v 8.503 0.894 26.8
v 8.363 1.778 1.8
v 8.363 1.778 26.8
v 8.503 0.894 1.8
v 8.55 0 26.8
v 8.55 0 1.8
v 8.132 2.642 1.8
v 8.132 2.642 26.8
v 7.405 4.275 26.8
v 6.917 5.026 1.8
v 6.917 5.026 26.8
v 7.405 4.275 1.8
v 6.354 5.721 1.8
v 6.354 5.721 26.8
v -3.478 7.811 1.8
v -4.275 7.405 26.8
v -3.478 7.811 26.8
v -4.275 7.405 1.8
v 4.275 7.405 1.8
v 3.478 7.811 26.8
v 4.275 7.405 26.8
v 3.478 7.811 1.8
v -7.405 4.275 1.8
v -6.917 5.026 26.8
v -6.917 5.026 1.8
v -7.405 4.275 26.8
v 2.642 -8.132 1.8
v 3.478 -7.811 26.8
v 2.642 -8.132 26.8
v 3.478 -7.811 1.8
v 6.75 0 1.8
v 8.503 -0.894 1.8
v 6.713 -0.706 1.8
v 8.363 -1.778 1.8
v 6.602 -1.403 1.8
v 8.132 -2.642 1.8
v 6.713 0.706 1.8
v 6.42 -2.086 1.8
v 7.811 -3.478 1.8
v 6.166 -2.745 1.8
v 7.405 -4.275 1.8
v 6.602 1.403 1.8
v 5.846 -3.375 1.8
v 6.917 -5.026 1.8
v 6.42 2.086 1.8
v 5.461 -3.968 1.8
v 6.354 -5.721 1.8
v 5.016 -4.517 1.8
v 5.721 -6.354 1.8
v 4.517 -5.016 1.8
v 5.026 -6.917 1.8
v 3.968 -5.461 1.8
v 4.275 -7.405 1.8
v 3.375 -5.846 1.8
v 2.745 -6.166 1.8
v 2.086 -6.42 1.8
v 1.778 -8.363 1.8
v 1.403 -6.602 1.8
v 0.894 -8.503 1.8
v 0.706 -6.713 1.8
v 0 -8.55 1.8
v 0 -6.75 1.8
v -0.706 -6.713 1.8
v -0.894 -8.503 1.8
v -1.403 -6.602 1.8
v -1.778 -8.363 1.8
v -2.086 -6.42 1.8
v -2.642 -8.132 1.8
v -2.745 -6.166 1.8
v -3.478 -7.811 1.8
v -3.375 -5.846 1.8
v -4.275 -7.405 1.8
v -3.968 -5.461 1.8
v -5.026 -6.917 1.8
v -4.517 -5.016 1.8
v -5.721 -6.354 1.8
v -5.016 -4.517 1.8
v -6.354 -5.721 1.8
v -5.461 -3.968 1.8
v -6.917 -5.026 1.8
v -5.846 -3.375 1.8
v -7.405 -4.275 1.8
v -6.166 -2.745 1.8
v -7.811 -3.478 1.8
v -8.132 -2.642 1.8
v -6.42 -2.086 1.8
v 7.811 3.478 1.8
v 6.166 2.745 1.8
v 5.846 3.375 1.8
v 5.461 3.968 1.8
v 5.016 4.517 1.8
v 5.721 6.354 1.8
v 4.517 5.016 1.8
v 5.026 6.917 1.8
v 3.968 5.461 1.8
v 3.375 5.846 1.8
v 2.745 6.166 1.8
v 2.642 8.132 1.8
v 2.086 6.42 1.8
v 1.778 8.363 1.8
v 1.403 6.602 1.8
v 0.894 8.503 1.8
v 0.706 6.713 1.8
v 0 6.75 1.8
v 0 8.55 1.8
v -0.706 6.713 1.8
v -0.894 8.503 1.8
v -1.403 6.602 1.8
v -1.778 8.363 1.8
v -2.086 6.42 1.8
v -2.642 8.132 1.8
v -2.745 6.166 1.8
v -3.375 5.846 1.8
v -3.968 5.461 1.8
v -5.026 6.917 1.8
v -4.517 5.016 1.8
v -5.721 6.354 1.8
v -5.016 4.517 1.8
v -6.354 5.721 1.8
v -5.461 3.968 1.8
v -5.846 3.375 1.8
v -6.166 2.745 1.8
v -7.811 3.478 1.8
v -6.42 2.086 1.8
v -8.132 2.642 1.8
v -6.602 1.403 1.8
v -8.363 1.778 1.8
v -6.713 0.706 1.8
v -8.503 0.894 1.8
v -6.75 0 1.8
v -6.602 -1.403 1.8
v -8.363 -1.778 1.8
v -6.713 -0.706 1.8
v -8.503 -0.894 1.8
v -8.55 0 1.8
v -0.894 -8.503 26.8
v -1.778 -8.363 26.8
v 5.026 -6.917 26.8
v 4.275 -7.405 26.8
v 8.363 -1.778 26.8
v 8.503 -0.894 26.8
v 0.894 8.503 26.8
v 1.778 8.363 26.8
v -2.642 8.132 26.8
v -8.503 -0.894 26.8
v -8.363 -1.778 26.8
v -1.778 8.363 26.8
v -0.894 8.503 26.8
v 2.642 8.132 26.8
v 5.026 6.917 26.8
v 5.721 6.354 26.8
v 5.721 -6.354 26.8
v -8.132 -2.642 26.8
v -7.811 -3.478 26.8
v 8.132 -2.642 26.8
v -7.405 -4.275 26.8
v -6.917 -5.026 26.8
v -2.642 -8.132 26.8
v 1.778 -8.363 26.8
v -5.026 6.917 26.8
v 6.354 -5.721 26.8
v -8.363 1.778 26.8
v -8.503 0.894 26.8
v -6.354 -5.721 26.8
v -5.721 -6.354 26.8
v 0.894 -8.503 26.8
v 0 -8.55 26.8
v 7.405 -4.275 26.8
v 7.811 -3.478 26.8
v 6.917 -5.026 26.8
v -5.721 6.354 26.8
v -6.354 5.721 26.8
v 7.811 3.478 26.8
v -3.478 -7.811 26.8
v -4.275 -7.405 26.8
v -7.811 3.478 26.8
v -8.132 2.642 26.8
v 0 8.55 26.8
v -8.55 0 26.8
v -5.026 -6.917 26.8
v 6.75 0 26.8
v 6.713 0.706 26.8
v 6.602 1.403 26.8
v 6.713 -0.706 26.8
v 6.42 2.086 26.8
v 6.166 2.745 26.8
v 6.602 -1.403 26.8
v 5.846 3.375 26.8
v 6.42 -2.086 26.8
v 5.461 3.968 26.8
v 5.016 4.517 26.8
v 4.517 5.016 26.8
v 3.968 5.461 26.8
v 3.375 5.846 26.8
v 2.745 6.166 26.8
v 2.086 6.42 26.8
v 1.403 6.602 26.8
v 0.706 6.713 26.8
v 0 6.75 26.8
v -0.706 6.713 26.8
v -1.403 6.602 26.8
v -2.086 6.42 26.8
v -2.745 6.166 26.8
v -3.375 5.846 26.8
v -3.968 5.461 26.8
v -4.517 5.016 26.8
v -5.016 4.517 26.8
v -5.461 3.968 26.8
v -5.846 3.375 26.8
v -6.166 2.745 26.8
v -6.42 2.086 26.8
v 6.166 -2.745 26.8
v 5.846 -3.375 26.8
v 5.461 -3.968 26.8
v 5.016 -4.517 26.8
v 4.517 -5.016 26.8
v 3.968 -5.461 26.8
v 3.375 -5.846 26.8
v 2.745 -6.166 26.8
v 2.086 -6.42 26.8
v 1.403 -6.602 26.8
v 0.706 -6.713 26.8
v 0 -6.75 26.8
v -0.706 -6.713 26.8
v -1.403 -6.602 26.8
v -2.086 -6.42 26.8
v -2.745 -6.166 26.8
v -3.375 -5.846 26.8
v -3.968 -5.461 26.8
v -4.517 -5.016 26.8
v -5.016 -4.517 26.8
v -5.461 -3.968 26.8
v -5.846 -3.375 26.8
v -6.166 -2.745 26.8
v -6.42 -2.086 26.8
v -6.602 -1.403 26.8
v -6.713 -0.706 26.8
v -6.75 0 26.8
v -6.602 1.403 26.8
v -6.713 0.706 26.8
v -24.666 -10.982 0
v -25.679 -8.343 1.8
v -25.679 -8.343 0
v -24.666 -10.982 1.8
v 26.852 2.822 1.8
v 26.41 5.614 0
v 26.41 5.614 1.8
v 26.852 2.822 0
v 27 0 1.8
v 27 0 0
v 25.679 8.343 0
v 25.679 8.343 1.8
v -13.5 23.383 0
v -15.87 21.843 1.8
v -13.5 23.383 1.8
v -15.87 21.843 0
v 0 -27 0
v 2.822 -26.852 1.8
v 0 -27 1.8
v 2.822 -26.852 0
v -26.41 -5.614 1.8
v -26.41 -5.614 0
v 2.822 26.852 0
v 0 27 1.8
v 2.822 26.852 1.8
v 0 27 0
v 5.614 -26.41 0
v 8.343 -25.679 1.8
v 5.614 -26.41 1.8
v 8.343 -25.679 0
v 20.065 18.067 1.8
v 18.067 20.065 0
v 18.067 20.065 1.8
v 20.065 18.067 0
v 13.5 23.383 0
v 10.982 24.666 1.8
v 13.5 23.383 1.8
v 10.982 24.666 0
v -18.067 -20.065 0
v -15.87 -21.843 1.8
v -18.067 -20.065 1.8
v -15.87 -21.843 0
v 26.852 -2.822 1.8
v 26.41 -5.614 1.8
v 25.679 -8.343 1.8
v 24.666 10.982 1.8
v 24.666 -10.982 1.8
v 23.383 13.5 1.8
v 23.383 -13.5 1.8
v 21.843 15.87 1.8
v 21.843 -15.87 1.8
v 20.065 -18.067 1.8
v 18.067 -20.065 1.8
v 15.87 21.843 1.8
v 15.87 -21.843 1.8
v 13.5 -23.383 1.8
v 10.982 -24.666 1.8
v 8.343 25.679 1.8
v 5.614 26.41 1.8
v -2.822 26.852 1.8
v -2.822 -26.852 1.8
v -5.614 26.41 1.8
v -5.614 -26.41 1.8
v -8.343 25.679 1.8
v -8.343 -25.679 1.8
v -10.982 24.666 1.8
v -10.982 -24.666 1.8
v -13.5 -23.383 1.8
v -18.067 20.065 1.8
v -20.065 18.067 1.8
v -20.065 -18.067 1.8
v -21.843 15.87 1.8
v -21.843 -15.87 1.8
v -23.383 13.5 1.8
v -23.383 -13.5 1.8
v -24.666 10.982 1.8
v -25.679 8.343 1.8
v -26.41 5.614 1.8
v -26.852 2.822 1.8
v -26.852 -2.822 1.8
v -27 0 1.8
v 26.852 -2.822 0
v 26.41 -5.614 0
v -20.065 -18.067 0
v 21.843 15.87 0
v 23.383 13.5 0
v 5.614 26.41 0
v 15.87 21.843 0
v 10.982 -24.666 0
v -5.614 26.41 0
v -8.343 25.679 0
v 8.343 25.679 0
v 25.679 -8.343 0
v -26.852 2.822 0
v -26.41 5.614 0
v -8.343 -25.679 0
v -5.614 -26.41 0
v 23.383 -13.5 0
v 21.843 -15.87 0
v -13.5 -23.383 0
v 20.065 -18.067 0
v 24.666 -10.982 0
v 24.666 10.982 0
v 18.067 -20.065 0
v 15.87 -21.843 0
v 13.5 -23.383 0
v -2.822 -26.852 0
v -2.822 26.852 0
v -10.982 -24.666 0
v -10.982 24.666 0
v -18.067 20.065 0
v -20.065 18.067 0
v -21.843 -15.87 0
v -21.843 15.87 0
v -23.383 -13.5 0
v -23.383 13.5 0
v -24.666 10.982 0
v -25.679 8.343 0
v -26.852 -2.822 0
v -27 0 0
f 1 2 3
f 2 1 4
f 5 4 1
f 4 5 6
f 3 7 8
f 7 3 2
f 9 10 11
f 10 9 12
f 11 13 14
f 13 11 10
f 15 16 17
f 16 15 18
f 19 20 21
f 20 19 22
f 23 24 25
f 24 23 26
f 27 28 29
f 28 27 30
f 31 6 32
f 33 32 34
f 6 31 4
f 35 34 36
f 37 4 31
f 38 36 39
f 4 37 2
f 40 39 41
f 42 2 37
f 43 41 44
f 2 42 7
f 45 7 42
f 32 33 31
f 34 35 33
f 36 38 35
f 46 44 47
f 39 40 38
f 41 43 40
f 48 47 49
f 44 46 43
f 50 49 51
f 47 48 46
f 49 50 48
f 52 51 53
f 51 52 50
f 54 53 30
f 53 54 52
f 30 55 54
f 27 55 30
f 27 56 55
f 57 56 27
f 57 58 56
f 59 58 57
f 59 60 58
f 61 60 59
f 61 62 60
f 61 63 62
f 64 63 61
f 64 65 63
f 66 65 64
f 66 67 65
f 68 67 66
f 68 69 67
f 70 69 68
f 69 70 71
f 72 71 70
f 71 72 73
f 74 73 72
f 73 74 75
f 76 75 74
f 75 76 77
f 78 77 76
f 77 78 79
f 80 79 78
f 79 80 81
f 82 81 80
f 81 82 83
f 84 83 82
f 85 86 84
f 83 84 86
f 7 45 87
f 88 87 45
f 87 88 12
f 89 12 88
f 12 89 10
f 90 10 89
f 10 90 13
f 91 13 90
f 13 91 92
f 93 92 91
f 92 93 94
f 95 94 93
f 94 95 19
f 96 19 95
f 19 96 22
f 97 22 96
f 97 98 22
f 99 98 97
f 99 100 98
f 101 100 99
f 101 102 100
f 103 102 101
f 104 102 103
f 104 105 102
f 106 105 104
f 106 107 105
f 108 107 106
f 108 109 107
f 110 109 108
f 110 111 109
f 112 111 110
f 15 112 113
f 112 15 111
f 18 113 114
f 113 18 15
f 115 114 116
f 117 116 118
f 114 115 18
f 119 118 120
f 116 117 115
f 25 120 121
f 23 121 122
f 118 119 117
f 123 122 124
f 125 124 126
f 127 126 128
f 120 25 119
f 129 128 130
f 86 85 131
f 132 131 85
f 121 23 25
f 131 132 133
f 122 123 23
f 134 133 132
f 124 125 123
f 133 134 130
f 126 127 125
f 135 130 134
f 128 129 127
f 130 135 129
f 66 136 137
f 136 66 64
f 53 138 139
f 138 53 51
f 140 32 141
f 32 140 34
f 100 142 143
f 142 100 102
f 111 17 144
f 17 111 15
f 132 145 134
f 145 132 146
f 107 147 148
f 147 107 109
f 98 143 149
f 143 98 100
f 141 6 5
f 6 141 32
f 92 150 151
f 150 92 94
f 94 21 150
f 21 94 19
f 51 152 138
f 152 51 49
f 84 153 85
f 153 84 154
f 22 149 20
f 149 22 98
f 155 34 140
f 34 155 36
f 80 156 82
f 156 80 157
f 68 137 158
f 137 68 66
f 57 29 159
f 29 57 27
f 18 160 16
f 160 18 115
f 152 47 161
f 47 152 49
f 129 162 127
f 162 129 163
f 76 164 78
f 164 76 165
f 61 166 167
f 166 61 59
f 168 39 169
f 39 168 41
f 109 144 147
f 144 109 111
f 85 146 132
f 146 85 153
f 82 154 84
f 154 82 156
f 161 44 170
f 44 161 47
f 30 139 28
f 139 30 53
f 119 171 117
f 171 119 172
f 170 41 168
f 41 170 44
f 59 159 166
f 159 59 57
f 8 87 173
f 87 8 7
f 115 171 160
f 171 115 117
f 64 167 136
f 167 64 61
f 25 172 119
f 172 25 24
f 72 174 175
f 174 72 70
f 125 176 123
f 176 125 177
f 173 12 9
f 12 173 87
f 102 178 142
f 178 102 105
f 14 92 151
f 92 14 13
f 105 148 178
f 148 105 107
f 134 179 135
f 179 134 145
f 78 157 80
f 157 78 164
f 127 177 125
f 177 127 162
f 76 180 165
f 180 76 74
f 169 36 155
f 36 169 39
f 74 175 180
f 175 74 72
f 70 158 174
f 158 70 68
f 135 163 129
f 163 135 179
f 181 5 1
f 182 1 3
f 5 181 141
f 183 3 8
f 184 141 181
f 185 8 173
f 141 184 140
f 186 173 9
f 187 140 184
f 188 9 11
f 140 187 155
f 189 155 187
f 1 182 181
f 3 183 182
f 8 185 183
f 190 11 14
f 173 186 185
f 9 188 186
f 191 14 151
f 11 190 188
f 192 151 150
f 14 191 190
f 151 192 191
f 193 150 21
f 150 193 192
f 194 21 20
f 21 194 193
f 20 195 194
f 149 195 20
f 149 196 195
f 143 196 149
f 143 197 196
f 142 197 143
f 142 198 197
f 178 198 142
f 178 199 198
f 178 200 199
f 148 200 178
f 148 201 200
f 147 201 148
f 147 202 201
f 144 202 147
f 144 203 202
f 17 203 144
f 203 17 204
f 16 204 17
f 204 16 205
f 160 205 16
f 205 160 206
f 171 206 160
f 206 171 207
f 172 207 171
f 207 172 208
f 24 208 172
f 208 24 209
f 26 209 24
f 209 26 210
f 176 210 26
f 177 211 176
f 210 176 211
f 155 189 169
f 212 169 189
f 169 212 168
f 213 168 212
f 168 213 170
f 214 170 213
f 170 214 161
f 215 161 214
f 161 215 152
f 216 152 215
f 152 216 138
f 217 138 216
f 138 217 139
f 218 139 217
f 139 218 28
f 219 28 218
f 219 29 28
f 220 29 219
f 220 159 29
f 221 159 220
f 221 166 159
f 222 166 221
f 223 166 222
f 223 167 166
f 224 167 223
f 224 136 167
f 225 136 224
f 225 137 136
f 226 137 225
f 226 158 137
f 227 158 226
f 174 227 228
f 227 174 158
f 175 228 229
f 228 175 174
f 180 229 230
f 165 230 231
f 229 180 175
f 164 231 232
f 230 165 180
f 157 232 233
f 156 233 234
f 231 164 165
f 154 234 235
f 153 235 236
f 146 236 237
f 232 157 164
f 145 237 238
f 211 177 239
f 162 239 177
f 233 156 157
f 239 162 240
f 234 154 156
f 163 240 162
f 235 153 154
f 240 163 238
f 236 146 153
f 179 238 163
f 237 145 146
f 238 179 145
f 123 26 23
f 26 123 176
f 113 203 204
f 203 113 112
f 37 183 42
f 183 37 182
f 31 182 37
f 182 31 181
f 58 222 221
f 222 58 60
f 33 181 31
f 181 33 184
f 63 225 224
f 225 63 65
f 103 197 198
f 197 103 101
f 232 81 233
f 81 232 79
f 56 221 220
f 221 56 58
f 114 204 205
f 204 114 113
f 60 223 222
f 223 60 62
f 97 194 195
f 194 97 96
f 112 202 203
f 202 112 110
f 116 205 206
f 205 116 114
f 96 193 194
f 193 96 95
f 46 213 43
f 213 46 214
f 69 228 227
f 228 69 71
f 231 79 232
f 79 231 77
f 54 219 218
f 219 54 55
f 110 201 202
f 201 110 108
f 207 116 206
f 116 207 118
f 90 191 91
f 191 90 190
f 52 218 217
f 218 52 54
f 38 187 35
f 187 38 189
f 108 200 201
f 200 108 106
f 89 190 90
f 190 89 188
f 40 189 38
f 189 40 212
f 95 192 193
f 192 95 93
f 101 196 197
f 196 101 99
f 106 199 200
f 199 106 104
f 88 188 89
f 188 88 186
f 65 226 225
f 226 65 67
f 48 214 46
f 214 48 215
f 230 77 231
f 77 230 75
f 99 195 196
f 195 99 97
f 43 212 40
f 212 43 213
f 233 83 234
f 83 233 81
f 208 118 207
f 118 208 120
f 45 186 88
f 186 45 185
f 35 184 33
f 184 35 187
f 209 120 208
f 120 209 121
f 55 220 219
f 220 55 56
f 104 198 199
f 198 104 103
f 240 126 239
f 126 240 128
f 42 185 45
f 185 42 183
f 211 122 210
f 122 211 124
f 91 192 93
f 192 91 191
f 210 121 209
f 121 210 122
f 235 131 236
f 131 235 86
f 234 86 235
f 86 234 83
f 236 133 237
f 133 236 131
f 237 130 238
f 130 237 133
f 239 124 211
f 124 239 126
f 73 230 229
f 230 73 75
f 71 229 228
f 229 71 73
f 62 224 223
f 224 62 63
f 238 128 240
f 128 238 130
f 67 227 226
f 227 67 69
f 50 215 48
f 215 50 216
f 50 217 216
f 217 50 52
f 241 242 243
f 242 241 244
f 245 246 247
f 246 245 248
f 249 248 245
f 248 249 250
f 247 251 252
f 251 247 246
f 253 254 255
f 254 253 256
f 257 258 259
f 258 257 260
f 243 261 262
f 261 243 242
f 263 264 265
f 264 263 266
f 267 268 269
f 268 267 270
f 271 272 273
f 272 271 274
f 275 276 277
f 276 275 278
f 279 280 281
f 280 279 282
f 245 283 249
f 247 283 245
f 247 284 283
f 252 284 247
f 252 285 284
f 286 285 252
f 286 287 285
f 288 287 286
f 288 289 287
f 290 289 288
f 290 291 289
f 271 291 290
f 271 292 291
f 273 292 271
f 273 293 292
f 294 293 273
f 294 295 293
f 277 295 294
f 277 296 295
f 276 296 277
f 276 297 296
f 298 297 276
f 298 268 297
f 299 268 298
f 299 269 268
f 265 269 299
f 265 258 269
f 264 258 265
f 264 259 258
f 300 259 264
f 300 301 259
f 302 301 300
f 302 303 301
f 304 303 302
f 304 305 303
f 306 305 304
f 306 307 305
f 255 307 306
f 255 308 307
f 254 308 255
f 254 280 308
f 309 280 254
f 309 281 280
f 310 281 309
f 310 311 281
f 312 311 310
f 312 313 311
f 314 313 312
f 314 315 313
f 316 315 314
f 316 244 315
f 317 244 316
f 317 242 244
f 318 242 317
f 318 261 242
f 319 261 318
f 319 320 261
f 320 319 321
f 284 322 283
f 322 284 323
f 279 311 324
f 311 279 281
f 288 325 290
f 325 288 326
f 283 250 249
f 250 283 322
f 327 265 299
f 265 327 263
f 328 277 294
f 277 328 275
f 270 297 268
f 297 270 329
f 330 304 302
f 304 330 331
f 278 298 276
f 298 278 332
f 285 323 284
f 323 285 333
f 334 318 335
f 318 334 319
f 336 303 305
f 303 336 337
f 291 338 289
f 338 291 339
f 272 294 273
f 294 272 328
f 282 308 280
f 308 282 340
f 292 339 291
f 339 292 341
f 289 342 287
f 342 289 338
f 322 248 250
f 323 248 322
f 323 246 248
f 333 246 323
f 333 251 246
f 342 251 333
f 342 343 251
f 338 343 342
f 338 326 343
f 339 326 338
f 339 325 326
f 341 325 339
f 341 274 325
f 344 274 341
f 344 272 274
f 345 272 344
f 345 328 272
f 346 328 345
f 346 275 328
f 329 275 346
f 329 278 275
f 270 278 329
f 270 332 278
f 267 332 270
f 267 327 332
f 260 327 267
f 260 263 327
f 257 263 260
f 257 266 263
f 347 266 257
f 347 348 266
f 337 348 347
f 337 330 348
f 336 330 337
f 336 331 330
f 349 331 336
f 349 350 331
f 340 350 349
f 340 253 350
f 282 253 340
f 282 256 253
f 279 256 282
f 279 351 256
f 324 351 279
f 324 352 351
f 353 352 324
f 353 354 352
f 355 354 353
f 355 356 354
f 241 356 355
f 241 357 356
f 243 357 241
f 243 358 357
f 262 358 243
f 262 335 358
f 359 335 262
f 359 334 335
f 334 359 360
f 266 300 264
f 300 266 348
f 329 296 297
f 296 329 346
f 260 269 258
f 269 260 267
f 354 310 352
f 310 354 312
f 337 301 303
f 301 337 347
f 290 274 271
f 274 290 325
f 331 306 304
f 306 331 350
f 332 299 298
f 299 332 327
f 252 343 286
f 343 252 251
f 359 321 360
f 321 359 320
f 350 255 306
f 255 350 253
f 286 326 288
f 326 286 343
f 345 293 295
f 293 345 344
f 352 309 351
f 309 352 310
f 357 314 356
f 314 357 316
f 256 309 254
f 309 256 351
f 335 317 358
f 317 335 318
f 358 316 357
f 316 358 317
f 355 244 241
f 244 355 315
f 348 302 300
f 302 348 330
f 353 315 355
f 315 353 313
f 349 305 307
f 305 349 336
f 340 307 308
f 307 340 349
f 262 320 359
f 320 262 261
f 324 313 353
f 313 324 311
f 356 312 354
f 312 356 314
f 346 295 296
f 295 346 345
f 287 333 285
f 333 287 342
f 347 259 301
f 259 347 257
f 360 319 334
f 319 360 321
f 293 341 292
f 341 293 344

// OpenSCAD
wall = 1.8;
support_d = 13.5;
support_h = 25;
$fn = 60;

union() {
  translate([0, 0, wall])
    difference() {
      cylinder(support_h, d=support_d+wall*2);
      cylinder(support_h, d=support_d);
    }
  cylinder(wall, d=support_d*4);
}
